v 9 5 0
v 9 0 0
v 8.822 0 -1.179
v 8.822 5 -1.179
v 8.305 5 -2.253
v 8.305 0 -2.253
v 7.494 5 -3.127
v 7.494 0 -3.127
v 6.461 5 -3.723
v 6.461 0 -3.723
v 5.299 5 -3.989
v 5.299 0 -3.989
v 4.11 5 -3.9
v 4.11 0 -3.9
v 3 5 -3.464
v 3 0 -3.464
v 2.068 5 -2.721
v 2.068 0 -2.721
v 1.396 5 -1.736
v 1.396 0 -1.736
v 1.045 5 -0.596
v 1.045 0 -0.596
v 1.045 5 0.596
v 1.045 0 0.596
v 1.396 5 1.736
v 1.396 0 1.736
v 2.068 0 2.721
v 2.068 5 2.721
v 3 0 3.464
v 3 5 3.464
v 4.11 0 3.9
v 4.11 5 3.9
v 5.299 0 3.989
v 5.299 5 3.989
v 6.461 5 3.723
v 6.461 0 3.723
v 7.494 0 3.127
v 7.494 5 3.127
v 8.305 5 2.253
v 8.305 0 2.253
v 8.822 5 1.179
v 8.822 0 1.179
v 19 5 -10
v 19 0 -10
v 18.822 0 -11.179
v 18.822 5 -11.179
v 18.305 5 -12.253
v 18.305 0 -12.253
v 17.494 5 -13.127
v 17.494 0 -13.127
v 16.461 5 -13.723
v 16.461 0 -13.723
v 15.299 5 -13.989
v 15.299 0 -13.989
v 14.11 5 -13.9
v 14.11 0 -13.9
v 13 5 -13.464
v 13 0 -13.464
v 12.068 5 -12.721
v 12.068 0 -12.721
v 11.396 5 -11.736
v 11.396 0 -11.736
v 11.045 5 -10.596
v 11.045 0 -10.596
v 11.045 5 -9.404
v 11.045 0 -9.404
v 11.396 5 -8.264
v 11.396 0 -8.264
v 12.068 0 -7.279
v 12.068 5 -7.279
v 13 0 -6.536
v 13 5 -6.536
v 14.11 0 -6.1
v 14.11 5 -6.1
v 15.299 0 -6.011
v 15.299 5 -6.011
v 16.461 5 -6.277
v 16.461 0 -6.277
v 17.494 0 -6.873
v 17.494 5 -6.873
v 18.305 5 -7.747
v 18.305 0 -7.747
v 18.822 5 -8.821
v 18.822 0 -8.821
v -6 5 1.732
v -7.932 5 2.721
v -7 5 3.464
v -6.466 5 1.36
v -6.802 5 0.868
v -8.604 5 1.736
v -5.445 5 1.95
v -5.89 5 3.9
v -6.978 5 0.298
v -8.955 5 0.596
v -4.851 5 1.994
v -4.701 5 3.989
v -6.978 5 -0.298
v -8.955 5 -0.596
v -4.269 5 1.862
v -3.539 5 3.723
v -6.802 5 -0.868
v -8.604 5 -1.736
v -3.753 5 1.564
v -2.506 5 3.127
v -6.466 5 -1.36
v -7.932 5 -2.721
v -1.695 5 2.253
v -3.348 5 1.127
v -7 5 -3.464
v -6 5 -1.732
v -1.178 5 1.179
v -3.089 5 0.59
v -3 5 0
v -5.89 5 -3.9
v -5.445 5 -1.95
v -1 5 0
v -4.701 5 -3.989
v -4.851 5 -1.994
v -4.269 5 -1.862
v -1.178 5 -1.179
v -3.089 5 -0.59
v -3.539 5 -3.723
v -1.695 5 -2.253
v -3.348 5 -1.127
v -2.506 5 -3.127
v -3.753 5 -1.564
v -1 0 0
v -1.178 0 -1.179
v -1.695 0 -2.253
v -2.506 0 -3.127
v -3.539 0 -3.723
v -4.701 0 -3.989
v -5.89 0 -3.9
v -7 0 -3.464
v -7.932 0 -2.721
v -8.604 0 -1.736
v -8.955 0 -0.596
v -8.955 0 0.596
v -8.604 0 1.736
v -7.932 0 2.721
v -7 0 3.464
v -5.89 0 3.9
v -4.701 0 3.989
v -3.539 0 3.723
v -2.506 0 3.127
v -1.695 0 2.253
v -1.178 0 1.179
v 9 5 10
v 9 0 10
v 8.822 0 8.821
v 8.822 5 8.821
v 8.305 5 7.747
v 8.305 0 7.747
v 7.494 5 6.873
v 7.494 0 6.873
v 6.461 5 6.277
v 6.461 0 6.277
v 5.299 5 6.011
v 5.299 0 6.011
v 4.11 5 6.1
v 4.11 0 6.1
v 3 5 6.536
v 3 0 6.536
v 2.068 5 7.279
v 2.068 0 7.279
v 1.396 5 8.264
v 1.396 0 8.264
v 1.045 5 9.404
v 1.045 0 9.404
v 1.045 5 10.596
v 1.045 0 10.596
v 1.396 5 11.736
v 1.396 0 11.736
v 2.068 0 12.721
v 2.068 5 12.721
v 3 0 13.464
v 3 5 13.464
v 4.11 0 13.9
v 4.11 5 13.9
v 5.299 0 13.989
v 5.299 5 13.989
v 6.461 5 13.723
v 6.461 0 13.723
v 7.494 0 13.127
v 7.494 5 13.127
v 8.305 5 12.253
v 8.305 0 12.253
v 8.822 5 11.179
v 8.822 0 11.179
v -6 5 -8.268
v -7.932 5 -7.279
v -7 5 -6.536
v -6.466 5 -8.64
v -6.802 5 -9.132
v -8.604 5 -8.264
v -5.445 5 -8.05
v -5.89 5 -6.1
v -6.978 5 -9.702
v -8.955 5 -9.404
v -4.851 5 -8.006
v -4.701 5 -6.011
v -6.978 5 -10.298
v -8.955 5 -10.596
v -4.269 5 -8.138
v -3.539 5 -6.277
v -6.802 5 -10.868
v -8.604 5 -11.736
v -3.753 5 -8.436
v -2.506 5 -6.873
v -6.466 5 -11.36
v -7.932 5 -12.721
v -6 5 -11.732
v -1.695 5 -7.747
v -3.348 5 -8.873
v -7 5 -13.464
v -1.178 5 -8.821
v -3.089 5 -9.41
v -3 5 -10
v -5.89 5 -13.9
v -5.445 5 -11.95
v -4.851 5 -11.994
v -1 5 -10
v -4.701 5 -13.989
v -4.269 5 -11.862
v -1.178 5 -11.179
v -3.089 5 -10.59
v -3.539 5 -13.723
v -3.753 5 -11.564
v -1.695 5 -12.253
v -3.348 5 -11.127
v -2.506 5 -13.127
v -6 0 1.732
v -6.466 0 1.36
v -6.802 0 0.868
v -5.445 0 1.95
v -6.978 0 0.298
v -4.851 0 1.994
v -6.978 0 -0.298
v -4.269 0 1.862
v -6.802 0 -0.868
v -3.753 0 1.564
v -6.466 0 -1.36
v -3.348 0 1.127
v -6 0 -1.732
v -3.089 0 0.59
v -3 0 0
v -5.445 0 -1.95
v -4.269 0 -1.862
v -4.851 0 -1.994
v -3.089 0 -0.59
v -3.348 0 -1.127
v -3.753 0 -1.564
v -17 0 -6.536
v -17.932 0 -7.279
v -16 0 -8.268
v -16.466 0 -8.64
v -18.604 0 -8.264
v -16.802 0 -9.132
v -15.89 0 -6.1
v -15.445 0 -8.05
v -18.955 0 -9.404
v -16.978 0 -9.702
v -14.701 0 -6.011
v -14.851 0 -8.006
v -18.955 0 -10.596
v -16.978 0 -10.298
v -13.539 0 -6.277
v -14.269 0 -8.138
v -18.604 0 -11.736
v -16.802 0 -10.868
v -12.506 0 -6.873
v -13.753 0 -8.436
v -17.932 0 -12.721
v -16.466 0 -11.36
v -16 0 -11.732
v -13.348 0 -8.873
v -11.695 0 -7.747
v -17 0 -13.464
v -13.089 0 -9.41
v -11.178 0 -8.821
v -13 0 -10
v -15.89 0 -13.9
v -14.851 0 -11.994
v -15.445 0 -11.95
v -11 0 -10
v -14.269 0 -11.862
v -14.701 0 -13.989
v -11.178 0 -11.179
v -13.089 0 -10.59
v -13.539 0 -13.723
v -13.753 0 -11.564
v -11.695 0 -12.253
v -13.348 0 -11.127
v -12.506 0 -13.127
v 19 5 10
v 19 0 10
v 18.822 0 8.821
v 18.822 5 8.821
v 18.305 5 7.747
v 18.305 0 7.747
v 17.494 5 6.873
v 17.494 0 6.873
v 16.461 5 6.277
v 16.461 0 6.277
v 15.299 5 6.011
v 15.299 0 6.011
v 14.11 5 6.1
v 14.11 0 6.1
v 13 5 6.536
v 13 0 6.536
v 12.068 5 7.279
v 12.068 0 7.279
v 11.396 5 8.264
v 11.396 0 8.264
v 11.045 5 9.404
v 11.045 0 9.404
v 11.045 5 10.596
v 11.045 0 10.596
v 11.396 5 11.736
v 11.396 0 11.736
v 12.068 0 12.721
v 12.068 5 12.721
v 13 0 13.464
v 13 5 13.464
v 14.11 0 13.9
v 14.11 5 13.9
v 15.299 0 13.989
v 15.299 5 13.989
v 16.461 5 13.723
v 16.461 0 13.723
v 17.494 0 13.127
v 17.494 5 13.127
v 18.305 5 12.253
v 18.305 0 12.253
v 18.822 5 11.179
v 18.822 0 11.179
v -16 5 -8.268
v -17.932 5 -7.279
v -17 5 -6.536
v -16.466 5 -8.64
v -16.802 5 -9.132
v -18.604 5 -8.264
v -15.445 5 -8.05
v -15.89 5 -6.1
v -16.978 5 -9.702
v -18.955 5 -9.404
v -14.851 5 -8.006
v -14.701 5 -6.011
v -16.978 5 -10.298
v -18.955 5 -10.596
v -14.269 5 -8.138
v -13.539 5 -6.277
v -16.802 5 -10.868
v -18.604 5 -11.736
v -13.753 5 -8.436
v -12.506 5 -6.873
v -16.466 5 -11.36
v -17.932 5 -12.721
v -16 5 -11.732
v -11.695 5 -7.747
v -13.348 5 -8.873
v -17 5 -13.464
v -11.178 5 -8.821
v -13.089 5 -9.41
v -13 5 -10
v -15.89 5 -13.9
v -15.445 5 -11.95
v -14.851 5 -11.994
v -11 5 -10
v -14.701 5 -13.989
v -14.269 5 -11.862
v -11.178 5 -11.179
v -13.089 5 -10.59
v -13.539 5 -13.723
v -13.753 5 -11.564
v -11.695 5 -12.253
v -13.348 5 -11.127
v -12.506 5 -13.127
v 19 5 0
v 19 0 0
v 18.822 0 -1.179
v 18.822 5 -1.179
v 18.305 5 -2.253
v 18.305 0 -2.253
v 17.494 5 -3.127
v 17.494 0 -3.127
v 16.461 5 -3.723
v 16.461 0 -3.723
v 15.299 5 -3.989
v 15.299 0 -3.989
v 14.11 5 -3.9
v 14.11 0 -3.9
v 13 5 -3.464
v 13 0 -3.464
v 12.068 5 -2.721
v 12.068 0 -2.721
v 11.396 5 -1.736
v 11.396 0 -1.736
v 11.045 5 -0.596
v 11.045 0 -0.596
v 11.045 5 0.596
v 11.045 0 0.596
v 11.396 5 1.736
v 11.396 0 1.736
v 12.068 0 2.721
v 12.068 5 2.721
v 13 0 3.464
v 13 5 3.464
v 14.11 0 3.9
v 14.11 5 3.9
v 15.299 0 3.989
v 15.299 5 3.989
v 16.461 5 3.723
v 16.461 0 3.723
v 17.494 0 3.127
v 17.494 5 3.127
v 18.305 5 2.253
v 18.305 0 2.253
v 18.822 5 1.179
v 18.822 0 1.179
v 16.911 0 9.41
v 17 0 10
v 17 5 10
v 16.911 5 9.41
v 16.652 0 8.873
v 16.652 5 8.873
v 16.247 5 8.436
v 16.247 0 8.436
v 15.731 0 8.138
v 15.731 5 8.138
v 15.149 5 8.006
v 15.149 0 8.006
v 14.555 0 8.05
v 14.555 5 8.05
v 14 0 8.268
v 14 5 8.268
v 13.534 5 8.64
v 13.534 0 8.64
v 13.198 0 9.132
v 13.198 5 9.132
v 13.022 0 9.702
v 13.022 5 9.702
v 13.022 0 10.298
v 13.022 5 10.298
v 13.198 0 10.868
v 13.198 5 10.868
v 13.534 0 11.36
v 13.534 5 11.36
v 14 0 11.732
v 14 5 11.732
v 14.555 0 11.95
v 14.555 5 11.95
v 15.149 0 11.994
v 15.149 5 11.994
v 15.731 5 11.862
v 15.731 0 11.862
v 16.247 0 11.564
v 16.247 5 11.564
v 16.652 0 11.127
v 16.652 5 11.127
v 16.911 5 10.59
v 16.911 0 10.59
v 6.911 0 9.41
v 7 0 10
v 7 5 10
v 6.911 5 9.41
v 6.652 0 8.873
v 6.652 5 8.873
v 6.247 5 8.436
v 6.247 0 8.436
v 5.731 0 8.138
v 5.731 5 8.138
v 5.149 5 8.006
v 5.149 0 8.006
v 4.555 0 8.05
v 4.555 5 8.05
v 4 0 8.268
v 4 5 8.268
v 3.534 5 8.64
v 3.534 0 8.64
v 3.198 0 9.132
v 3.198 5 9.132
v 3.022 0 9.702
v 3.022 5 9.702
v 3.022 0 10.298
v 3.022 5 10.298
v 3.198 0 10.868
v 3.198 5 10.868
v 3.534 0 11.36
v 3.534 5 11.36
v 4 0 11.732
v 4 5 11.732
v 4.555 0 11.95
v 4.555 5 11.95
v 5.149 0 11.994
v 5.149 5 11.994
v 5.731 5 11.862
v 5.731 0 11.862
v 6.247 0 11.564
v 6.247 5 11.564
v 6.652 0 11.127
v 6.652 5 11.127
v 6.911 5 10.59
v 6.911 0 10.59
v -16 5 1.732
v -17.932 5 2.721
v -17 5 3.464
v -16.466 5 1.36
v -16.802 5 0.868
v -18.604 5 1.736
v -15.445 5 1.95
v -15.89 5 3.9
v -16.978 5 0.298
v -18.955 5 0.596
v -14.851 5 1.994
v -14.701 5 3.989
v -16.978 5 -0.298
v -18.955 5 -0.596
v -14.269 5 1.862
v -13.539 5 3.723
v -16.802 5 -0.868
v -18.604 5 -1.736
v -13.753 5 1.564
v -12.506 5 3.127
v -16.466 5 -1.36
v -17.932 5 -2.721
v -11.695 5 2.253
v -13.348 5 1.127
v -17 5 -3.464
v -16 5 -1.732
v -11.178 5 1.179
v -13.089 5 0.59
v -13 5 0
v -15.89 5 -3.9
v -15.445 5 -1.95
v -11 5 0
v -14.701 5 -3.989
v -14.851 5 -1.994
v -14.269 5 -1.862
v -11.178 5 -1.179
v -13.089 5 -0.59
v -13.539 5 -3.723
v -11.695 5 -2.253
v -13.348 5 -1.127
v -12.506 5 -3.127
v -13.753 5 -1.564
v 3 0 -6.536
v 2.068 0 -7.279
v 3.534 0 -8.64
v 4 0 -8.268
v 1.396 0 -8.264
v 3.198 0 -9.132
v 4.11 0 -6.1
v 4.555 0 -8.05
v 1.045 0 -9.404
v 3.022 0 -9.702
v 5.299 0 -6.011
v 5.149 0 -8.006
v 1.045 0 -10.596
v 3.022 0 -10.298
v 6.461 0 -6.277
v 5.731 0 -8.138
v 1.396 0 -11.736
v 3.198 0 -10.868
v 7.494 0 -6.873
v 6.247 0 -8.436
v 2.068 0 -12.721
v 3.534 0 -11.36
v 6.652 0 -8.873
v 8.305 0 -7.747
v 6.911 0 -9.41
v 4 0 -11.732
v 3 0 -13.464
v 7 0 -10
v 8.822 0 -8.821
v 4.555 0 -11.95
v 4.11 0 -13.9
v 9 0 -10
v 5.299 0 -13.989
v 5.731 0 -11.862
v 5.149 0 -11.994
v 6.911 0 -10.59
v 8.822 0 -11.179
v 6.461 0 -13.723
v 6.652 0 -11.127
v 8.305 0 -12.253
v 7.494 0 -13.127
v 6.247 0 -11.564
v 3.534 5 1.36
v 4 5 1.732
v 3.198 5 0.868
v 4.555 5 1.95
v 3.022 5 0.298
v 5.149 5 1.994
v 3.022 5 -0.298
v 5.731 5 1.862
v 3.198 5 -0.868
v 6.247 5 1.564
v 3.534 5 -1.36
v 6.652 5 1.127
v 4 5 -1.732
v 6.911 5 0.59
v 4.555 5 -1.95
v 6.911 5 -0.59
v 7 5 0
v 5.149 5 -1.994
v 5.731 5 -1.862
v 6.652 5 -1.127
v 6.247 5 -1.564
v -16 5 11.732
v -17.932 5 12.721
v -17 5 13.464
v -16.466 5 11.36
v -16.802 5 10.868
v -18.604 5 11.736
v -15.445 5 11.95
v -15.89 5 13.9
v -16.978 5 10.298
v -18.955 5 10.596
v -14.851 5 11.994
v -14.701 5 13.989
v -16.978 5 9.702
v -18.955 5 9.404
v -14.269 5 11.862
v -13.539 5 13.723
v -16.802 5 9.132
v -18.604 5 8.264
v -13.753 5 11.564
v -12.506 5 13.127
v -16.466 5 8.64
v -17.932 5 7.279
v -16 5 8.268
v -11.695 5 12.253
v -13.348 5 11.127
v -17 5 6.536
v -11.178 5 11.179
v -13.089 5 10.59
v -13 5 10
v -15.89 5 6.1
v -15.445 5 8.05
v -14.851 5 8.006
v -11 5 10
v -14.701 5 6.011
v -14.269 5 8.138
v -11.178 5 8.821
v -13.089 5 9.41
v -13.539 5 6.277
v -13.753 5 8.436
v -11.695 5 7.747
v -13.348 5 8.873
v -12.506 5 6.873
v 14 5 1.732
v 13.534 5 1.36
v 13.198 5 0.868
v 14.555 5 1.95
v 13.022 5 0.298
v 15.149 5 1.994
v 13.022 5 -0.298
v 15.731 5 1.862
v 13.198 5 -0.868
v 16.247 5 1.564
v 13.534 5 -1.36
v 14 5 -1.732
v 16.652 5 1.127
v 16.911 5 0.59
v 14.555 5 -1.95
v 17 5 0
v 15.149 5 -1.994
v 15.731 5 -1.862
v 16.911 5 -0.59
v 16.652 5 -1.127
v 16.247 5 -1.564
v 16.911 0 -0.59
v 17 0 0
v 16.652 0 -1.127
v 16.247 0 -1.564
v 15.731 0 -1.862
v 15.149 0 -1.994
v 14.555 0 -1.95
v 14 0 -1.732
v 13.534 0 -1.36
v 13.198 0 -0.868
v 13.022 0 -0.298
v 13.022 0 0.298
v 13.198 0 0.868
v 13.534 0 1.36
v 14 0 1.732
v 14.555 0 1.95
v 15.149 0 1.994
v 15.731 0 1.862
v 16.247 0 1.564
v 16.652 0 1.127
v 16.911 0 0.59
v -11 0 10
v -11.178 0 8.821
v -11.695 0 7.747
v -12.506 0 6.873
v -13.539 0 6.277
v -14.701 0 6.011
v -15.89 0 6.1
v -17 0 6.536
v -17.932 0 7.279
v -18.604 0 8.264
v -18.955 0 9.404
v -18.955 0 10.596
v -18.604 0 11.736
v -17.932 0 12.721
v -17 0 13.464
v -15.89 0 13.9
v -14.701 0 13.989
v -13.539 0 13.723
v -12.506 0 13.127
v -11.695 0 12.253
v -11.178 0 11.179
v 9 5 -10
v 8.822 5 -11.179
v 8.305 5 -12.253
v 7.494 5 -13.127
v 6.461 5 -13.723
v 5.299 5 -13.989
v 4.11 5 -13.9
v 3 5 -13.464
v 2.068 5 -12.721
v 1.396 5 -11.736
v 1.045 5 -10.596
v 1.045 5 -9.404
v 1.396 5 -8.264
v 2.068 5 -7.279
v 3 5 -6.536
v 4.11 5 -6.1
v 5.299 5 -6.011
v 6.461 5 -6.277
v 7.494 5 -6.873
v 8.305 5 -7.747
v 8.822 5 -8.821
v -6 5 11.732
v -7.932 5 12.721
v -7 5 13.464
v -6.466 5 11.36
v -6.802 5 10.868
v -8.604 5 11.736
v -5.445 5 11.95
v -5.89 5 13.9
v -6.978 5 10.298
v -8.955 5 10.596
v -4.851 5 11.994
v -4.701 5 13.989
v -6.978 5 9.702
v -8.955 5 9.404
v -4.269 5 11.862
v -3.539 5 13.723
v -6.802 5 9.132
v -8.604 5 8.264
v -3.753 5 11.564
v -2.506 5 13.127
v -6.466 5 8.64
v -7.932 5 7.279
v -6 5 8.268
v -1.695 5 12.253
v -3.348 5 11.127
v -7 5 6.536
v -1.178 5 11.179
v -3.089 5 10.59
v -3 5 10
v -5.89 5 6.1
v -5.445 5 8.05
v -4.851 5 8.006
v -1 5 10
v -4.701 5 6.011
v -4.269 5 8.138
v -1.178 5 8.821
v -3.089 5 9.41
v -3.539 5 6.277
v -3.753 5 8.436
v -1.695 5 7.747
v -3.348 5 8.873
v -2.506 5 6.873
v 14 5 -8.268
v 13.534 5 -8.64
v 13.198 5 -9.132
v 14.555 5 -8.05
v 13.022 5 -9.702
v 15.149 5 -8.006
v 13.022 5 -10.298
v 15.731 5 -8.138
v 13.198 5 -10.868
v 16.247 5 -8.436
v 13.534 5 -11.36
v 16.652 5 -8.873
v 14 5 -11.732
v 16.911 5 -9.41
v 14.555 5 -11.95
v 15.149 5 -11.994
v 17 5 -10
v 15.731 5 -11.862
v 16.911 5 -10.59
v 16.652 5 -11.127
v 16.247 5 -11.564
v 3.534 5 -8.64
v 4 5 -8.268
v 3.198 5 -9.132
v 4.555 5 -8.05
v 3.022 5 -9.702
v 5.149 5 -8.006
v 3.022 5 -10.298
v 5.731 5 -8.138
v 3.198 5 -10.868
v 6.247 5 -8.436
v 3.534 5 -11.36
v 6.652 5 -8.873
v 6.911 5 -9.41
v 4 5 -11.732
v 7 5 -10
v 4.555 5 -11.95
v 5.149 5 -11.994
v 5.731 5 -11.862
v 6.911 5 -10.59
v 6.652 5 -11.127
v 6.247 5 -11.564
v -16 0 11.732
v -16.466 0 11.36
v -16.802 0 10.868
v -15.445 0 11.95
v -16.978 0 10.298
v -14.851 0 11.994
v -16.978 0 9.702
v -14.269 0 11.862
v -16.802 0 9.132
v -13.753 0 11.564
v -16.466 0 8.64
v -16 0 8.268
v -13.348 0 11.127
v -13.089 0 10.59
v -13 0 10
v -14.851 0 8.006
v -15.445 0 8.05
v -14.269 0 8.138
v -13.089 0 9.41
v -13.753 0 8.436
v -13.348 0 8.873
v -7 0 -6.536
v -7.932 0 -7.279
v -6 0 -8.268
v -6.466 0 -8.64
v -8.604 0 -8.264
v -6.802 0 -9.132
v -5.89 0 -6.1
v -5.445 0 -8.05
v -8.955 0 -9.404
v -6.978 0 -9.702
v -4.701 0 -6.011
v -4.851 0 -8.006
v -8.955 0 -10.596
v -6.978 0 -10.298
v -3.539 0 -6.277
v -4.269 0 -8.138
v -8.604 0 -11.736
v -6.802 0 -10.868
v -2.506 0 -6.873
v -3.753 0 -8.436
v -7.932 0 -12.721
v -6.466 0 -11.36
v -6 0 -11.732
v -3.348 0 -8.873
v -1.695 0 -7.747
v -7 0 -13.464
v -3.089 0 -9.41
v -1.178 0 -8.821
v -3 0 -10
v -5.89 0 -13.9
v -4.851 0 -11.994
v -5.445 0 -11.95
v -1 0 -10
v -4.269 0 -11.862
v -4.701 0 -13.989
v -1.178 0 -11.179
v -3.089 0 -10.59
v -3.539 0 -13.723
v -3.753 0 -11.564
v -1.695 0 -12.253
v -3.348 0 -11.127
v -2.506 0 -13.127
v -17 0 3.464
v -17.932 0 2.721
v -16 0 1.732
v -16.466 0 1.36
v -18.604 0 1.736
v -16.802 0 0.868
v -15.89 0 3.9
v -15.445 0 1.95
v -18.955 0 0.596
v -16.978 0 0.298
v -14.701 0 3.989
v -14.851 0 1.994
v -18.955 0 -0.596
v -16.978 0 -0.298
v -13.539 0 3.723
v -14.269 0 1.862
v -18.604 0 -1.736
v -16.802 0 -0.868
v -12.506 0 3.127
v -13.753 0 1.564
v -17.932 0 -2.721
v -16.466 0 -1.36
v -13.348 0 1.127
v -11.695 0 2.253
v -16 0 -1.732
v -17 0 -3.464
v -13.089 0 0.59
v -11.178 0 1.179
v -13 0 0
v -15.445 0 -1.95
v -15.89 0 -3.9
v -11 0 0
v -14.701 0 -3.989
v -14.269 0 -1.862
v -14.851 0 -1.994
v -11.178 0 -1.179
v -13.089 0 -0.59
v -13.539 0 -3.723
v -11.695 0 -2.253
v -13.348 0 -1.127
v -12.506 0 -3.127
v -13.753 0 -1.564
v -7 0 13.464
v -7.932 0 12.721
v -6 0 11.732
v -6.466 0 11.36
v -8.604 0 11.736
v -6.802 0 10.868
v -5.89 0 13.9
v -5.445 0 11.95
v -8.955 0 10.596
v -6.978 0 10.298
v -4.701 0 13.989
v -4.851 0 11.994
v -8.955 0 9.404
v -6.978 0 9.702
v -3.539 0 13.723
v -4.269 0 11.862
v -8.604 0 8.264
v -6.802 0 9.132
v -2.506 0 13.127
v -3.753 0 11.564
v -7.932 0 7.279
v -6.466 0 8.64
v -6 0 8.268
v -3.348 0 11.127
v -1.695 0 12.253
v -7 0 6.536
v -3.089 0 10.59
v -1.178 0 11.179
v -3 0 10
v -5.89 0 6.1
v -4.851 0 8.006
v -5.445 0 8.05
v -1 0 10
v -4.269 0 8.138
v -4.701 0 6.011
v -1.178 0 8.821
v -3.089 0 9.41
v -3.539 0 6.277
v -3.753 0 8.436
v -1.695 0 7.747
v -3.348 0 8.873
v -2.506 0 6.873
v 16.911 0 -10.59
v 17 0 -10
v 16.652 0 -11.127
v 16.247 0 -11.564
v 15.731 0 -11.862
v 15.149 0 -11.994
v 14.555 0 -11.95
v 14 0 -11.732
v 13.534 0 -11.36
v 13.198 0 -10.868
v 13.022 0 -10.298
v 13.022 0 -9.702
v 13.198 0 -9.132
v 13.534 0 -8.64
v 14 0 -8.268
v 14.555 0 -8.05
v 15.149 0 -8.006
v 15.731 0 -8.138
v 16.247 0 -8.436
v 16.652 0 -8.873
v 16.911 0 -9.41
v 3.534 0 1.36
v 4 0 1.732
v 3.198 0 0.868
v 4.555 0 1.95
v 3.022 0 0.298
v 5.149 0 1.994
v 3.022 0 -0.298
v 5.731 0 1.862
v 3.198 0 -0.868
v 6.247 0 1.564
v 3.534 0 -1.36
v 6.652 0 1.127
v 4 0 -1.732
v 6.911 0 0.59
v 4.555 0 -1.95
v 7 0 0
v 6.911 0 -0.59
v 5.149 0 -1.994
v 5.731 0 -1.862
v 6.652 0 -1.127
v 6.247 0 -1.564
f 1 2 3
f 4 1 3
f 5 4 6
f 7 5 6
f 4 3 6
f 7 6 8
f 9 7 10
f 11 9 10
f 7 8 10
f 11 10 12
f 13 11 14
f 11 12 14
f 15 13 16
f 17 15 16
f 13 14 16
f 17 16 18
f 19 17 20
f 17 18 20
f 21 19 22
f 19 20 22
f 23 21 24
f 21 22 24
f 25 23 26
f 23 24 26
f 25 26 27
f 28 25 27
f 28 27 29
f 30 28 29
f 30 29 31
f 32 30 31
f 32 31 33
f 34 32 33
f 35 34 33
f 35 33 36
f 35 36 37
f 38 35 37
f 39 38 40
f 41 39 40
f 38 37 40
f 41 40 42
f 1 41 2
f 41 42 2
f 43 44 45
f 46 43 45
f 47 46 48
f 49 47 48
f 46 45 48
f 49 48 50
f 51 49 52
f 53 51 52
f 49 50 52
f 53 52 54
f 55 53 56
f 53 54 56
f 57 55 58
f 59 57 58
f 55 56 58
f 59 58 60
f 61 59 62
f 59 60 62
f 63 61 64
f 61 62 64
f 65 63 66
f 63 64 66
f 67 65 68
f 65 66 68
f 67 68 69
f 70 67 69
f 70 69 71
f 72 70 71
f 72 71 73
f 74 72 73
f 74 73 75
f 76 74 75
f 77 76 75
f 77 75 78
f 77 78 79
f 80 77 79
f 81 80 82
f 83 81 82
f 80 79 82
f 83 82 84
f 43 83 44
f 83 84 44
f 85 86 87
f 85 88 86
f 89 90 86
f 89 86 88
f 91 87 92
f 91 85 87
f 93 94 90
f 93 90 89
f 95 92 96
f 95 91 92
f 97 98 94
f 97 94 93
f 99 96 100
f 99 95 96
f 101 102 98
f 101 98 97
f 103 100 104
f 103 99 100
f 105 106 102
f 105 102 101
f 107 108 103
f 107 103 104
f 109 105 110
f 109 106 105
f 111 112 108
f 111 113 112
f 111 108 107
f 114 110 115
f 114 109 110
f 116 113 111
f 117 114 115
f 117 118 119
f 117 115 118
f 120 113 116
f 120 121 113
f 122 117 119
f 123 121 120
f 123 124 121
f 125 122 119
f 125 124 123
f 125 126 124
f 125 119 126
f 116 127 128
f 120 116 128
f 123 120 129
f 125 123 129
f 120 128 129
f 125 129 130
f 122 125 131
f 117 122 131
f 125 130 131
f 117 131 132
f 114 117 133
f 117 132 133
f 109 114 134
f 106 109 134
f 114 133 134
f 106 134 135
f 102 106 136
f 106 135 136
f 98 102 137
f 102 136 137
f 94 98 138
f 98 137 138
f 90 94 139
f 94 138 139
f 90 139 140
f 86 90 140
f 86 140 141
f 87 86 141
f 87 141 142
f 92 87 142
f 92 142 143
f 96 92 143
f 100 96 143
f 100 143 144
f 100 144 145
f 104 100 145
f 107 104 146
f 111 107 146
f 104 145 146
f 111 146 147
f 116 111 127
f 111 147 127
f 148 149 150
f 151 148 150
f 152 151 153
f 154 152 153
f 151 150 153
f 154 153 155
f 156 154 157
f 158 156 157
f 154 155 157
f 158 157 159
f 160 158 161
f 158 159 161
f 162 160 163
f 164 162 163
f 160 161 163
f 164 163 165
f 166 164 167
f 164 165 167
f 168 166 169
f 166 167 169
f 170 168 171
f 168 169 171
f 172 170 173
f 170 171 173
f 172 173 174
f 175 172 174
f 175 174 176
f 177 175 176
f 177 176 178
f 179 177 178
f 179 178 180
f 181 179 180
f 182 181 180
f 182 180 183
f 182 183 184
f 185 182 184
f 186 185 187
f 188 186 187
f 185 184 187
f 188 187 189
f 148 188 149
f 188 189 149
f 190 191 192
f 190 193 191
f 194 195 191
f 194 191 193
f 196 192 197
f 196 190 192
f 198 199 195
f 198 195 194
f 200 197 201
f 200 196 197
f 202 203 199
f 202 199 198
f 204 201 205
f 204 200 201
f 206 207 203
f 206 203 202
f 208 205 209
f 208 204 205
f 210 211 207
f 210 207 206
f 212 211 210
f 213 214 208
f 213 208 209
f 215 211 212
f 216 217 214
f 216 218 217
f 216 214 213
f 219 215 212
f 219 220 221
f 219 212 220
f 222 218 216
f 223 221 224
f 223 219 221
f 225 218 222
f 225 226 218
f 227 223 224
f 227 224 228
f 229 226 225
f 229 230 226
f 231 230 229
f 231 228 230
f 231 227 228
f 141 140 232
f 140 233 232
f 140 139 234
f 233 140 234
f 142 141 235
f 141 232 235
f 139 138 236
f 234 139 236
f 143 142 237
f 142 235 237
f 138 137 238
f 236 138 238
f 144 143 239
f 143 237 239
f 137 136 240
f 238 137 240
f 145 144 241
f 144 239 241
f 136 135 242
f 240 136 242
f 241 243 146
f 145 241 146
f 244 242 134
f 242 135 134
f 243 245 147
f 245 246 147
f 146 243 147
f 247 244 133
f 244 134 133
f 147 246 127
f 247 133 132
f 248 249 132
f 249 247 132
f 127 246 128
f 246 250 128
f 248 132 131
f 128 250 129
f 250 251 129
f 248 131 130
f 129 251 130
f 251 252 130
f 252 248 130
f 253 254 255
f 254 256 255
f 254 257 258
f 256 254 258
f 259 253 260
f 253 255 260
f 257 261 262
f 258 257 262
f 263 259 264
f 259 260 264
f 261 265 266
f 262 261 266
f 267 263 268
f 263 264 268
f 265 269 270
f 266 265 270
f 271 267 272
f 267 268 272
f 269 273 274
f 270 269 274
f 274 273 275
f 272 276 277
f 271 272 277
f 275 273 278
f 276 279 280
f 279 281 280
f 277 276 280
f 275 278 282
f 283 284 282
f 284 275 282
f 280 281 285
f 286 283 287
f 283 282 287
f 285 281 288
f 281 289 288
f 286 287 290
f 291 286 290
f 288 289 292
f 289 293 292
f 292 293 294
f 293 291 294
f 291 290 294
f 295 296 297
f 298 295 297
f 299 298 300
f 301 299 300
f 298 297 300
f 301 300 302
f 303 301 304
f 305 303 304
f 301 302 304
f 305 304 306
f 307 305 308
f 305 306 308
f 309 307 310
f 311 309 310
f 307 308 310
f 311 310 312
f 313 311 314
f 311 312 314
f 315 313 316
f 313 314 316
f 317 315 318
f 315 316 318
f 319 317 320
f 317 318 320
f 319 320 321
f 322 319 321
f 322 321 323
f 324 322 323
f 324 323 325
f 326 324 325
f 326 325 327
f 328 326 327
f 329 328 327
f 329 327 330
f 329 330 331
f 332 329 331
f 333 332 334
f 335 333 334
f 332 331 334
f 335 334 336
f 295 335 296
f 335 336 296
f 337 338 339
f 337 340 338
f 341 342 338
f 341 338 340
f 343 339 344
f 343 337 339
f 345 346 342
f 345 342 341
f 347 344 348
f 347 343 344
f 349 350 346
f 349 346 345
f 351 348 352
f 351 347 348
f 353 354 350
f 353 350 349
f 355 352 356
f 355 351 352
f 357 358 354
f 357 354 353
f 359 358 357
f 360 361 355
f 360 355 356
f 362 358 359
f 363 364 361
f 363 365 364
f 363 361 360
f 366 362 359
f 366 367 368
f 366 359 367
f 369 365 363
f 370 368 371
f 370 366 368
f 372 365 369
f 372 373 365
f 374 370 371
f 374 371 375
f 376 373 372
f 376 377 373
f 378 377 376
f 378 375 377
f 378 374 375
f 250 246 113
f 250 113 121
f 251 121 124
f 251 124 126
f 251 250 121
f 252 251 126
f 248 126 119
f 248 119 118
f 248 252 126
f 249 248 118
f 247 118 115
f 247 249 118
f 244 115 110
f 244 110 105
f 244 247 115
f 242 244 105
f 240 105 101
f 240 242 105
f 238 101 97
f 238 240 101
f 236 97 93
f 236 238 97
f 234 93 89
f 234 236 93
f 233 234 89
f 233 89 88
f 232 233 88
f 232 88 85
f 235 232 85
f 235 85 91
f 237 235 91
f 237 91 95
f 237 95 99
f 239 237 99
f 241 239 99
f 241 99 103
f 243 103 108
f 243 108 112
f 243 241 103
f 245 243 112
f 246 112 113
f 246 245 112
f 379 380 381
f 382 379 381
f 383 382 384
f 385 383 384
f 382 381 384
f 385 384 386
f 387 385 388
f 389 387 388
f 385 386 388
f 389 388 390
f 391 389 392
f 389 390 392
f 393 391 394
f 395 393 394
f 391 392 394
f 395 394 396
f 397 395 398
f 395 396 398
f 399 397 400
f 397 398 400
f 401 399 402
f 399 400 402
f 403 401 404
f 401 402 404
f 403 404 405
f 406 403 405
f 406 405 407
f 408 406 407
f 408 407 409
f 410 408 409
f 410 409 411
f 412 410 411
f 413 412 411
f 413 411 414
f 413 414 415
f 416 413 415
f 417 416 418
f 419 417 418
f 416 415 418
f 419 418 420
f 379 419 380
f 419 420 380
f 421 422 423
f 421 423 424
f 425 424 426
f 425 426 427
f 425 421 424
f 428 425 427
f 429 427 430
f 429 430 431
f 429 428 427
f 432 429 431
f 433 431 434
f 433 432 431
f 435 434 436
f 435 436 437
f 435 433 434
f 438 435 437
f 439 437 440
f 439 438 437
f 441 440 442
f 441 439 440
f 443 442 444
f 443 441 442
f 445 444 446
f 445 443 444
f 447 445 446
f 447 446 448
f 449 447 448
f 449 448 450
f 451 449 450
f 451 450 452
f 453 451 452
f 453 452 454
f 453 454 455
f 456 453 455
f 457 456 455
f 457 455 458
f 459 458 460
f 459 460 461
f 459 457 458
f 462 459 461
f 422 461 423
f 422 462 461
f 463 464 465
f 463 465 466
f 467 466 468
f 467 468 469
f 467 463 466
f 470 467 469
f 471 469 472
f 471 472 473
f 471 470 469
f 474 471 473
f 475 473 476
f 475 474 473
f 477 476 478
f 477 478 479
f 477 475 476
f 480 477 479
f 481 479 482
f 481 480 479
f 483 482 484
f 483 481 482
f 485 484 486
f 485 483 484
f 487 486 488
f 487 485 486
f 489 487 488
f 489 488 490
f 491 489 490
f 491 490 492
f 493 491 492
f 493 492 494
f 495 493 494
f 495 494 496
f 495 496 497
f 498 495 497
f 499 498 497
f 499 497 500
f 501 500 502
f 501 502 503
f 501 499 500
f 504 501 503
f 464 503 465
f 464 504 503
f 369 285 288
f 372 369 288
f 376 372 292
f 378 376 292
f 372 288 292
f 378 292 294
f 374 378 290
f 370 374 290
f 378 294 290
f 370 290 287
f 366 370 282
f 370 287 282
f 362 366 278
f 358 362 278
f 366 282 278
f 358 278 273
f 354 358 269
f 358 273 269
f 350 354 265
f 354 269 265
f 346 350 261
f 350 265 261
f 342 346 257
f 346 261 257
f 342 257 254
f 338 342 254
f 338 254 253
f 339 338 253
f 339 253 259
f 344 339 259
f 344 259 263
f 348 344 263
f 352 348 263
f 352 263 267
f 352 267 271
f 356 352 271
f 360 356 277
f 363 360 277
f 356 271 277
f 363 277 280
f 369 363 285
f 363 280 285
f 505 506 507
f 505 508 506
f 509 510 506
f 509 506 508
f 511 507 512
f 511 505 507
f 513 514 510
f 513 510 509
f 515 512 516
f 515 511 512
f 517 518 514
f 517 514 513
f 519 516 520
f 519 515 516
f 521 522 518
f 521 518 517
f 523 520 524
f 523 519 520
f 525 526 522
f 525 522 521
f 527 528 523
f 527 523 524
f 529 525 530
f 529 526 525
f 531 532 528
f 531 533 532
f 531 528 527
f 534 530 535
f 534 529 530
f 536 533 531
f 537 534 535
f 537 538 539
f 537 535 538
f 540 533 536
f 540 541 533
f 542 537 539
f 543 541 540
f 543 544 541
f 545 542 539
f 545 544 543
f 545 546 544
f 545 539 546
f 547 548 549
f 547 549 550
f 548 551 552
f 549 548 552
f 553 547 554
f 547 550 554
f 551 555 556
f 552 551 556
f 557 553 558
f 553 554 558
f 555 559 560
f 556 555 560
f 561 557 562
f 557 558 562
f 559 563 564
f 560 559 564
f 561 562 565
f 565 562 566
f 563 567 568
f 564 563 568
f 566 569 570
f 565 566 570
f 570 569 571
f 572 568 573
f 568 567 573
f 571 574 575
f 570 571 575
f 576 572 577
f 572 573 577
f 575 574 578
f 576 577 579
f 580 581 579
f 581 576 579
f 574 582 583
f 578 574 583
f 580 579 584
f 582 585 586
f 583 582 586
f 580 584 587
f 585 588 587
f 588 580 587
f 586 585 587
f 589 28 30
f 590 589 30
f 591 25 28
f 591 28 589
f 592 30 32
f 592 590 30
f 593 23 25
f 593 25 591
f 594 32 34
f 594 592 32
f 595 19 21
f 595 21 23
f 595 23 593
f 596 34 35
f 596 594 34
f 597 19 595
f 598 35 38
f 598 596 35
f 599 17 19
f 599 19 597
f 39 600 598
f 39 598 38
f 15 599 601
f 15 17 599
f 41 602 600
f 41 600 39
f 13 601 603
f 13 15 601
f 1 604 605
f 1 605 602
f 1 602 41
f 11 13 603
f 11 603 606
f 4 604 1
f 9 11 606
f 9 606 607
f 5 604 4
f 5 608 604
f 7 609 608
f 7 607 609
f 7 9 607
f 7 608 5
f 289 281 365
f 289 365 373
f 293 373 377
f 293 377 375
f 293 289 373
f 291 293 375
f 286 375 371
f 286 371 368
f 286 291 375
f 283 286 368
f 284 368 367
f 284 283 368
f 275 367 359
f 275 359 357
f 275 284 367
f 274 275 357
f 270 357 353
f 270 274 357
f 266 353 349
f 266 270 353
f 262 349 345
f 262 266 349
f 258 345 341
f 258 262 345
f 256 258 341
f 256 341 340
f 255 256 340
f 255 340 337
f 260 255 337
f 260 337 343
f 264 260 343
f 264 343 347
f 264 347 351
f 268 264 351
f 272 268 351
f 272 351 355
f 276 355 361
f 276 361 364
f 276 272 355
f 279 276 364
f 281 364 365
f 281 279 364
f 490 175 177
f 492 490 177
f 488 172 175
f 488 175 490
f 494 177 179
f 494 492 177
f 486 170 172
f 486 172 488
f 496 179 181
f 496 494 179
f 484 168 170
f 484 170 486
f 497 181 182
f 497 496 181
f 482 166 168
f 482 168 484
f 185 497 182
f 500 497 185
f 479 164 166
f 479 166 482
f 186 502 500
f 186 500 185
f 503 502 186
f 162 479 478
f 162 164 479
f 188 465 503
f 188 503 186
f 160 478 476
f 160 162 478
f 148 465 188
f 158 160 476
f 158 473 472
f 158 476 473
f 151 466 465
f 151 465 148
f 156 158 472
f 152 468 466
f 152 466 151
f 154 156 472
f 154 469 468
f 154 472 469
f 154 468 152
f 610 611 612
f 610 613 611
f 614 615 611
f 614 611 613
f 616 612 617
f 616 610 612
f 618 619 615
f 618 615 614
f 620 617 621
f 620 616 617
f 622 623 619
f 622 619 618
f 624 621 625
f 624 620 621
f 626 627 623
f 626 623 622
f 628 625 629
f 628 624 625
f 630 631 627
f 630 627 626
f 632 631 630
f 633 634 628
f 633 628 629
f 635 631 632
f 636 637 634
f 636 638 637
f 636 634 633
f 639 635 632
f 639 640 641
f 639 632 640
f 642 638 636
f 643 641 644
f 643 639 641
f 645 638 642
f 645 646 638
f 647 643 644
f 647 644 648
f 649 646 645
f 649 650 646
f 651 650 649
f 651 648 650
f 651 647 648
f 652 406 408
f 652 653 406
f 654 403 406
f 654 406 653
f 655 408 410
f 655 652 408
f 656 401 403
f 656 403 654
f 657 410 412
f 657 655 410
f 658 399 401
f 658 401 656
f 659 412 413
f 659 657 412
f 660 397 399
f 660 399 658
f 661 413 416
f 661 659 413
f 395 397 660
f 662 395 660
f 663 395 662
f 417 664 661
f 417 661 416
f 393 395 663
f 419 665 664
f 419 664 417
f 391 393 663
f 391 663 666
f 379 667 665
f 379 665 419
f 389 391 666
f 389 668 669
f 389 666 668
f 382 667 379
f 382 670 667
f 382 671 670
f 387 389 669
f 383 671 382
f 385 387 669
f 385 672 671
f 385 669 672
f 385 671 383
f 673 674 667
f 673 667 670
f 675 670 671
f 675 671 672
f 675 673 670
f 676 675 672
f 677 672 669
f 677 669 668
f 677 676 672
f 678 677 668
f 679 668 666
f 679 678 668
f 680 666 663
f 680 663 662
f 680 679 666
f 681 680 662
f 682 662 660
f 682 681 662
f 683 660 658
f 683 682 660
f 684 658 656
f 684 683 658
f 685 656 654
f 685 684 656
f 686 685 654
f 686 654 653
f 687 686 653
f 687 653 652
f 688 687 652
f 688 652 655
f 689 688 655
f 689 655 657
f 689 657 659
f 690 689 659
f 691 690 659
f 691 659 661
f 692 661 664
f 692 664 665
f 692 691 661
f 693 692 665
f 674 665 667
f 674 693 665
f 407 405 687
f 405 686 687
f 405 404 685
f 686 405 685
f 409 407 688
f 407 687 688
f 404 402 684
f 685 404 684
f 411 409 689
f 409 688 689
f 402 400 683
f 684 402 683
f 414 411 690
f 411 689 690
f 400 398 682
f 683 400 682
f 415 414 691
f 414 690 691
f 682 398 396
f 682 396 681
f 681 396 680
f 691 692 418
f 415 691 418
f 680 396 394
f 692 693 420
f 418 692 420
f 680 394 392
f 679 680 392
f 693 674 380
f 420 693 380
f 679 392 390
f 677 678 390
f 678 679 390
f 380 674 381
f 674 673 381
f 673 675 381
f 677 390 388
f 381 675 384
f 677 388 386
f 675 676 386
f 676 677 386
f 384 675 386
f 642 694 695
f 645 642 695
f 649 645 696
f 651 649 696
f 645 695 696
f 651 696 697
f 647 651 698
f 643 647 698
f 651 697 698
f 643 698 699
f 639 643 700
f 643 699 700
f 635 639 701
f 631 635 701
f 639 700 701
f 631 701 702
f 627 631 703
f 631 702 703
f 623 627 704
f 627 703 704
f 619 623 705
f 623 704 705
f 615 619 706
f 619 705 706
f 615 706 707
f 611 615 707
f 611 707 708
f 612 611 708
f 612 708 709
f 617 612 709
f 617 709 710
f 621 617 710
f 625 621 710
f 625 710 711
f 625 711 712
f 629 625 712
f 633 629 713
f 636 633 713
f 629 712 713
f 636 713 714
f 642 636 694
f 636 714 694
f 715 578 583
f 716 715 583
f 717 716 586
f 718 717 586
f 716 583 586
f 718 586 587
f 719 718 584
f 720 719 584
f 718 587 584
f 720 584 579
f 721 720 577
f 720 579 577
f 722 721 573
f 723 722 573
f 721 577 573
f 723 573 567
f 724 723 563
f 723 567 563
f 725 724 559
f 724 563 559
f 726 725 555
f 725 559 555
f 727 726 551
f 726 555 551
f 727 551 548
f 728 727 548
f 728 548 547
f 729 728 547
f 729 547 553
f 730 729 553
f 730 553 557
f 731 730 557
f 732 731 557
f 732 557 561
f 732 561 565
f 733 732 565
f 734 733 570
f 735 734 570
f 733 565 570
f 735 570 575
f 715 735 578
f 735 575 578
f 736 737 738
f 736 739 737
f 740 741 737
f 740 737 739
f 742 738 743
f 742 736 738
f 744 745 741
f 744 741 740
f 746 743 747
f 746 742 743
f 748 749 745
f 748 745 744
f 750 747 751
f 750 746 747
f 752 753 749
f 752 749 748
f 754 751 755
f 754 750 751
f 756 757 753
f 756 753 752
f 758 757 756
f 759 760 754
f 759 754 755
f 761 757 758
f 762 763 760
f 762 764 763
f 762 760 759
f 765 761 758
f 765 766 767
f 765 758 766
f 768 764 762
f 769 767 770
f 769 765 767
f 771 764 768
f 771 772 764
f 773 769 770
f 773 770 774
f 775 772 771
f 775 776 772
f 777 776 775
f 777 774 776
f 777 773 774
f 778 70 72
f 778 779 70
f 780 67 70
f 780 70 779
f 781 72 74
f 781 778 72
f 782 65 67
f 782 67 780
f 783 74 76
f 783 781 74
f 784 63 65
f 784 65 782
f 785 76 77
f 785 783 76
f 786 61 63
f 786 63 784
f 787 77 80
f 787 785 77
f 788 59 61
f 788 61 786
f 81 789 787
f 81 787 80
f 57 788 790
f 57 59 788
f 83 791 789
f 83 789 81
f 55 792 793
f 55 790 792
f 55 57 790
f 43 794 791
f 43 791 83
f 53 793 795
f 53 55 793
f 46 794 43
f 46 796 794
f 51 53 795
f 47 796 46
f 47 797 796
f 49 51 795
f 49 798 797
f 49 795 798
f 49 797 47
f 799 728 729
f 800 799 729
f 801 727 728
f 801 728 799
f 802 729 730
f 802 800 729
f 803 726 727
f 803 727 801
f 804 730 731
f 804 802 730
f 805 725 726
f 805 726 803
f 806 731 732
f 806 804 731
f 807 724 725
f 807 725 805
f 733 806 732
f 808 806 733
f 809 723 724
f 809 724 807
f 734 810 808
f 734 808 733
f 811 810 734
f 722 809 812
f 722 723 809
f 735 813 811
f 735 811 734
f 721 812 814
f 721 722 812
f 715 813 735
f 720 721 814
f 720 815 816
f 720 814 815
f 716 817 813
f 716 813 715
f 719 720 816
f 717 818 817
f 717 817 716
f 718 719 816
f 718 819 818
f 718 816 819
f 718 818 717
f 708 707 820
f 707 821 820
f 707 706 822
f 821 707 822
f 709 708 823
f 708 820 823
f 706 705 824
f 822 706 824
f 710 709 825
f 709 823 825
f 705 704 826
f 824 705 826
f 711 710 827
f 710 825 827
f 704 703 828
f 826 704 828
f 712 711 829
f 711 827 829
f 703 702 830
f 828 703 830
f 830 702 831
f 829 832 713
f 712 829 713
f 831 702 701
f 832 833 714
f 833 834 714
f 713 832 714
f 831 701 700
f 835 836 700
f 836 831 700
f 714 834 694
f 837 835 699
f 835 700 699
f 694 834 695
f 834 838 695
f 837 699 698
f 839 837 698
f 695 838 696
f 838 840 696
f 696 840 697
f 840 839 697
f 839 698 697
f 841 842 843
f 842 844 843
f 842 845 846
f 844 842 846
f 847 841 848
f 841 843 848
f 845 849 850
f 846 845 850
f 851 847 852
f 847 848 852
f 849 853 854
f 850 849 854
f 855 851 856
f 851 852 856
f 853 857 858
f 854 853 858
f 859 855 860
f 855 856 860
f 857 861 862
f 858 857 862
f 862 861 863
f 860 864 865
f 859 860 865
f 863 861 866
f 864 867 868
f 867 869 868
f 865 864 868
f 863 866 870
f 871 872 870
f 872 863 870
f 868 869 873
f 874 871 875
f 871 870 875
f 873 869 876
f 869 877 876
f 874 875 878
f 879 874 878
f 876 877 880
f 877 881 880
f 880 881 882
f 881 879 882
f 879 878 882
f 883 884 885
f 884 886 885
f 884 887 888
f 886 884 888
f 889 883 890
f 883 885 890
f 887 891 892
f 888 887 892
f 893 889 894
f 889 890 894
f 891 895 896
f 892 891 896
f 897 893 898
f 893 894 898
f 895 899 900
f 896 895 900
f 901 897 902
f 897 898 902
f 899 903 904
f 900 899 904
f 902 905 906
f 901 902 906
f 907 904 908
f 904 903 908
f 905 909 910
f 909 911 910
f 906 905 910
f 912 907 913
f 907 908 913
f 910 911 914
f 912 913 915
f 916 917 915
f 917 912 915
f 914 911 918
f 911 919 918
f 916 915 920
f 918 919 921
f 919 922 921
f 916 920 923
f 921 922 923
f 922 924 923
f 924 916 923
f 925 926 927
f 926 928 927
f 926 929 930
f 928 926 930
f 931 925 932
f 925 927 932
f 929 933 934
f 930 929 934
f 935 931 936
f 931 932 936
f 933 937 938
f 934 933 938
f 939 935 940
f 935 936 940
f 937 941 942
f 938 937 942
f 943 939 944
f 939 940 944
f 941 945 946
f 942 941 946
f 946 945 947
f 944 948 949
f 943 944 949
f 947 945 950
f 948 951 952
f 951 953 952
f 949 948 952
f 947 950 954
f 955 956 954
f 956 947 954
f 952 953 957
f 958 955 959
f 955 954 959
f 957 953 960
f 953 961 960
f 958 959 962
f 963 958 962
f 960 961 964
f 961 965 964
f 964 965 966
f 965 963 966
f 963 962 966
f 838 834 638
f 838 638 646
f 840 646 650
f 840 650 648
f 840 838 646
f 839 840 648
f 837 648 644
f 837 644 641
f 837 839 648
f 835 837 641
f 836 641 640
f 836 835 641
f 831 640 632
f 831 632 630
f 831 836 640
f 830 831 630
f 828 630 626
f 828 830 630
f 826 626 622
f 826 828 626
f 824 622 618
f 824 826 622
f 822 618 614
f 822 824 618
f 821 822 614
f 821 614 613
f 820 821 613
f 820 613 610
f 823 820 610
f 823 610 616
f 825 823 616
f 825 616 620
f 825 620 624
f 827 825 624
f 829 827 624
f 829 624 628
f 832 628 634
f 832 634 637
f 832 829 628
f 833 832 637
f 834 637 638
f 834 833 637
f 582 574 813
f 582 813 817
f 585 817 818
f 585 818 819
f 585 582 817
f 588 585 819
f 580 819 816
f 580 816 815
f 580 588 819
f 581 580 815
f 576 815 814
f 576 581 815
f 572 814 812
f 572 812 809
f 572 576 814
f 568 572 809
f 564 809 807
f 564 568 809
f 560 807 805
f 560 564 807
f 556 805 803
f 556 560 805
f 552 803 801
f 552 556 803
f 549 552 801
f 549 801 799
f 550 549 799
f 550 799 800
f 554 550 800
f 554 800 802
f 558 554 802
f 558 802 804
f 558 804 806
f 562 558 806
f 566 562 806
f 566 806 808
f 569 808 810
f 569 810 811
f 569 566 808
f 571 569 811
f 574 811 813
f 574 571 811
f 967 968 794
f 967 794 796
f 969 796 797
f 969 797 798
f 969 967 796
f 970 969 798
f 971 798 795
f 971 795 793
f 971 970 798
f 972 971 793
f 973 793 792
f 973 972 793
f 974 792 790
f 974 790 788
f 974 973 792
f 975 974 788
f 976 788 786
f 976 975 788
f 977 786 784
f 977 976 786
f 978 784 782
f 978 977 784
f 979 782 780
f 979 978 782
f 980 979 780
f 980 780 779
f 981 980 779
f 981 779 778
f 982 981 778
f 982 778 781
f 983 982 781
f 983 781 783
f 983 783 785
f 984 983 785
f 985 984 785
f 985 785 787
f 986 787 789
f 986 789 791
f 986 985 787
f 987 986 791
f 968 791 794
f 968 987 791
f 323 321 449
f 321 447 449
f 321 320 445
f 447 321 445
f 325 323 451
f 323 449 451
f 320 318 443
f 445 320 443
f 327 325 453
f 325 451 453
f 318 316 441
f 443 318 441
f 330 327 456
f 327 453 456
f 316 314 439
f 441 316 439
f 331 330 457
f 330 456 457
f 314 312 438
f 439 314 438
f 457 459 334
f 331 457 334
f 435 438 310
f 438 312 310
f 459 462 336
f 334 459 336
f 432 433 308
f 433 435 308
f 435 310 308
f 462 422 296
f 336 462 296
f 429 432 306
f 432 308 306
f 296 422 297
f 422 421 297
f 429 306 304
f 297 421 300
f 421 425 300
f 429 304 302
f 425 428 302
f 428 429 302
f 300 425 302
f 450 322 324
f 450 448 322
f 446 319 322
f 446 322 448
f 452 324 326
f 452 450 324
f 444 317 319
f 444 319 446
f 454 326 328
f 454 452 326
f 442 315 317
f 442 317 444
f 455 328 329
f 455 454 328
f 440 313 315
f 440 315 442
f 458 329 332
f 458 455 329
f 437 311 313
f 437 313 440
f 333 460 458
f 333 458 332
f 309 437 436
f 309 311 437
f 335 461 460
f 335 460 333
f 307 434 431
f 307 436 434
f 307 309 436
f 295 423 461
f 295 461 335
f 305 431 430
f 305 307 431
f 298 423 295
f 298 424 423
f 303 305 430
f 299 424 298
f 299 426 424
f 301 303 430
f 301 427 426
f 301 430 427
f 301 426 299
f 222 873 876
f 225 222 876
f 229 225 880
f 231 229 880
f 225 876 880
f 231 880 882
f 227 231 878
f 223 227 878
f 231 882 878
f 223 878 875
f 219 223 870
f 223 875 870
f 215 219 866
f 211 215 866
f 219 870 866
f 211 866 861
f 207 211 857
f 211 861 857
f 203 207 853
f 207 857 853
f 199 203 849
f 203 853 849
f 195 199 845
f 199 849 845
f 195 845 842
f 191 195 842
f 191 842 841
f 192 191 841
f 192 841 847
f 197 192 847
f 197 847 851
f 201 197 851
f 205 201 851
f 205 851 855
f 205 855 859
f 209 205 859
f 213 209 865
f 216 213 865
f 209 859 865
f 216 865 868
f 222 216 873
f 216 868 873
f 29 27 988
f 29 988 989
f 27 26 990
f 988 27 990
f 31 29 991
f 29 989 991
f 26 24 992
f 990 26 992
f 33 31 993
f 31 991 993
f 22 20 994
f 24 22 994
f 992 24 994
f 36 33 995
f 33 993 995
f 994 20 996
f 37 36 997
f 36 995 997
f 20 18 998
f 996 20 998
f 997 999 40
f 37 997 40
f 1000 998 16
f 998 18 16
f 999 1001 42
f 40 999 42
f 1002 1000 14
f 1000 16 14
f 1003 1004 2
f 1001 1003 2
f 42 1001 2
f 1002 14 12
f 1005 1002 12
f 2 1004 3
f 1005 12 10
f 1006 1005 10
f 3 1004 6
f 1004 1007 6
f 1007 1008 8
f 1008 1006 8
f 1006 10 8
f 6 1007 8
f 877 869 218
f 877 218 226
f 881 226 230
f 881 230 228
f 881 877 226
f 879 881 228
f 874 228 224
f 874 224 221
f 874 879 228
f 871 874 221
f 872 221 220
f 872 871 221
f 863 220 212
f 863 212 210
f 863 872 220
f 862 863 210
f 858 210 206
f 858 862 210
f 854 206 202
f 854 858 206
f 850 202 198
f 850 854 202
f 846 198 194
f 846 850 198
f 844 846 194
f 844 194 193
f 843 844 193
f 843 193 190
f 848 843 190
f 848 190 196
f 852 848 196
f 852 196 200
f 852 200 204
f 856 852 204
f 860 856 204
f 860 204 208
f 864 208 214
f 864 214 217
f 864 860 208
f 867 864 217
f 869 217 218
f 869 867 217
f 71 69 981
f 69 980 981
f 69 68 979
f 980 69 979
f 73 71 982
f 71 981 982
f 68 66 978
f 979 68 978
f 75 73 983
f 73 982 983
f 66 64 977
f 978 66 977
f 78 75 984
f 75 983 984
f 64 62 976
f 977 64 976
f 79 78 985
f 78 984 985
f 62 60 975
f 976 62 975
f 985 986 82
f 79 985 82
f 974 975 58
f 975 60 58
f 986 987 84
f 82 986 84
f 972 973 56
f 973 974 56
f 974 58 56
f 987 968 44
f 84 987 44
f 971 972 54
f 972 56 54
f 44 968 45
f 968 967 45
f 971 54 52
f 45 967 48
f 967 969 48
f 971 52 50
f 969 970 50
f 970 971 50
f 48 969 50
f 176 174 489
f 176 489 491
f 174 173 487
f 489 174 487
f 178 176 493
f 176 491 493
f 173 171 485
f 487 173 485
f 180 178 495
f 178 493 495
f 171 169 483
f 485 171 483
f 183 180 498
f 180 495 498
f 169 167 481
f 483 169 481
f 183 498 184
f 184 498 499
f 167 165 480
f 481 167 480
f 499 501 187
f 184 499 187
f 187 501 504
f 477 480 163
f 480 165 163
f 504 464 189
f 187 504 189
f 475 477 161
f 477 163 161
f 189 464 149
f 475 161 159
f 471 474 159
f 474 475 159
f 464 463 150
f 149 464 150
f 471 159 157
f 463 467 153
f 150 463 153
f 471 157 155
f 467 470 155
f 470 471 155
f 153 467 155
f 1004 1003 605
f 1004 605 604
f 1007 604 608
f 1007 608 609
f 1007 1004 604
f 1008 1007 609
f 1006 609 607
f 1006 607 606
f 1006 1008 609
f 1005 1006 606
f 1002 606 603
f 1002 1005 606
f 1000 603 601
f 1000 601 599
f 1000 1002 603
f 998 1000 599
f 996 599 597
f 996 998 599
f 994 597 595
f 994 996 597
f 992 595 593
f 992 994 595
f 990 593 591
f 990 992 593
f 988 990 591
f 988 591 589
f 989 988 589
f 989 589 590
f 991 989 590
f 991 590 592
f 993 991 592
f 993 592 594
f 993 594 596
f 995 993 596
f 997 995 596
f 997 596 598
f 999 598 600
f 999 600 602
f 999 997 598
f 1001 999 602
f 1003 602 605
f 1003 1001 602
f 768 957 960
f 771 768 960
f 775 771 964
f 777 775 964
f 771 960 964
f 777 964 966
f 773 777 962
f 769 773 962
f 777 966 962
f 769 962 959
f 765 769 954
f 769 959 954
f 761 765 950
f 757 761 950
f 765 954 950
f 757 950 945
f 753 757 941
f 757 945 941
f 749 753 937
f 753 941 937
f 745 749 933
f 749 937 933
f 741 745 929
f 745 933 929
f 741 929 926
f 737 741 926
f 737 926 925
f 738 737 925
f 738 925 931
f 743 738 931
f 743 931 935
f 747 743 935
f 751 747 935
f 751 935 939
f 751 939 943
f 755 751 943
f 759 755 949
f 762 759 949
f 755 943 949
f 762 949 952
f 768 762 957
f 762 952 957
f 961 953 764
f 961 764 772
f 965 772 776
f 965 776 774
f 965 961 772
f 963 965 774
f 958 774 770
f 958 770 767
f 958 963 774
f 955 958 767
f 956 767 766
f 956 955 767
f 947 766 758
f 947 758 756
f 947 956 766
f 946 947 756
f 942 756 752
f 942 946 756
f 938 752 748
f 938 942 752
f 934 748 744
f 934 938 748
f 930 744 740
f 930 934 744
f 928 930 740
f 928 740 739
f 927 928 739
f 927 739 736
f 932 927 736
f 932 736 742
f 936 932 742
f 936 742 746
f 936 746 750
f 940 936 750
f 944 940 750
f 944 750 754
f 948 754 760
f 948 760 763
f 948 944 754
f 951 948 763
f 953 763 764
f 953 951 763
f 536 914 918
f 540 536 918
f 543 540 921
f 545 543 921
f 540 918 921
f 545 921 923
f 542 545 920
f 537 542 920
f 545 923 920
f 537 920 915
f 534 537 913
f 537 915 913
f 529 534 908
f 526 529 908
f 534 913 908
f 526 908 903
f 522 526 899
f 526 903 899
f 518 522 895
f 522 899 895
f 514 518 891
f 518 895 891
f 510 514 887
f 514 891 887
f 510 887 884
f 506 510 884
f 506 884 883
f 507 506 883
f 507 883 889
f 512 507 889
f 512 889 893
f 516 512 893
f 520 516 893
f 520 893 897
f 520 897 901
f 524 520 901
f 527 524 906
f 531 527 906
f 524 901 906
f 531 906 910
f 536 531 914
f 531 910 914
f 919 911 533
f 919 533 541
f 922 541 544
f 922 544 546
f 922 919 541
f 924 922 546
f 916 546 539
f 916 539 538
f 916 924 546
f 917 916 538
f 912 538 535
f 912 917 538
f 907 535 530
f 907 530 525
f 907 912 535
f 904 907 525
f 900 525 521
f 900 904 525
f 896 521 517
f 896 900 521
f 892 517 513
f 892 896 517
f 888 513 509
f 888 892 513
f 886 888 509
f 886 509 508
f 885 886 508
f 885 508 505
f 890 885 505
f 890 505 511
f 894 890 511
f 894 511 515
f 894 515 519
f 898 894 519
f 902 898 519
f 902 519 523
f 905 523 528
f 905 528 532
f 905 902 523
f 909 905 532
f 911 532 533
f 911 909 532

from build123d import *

# Parameters (mm, degrees)
SKETCH1_R              = 4
SKETCH1_R_2            = 2
BOSS_EXTRUDE1_DEPTH    = 5
BOSS_EXTRUDE1_2_DEPTH  = 5
BOSS_EXTRUDE1_3_DEPTH  = 5
BOSS_EXTRUDE1_4_DEPTH  = 5
BOSS_EXTRUDE1_5_DEPTH  = 5
BOSS_EXTRUDE1_6_DEPTH  = 5
BOSS_EXTRUDE1_7_DEPTH  = 5
BOSS_EXTRUDE1_8_DEPTH  = 5
BOSS_EXTRUDE1_9_DEPTH  = 5
BOSS_EXTRUDE1_10_DEPTH = 5
BOSS_EXTRUDE1_11_DEPTH = 5
BOSS_EXTRUDE1_12_DEPTH = 5


with BuildPart() as part:
    # Sketch1 → Boss-Extrude1 (new body)
    with BuildSketch(Plane(origin=(0, 0, 0), x_dir=(1, 0, 0), z_dir=(0, 1, 0))):
        with Locations((-15, -10)):
            Circle(SKETCH1_R)
        with Locations((-15, -10)):
            Circle(SKETCH1_R_2, mode=Mode.SUBTRACT)
    extrude(amount=BOSS_EXTRUDE1_DEPTH)


with BuildPart() as body_2:
    # Sketch1 → Boss-Extrude1 2 (new body)
    with BuildSketch(Plane(origin=(0, 0, 0), x_dir=(1, 0, 0), z_dir=(0, 1, 0))):
        with Locations((-5, -10)):
            Circle(SKETCH1_R)
        with Locations((-5, -10)):
            Circle(SKETCH1_R_2, mode=Mode.SUBTRACT)
    extrude(amount=BOSS_EXTRUDE1_2_DEPTH)


with BuildPart() as body_3:
    # Sketch1 → Boss-Extrude1 3 (new body)
    with BuildSketch(Plane(origin=(0, 0, 0), x_dir=(1, 0, 0), z_dir=(0, 1, 0))):
        with Locations((5, -10)):
            Circle(SKETCH1_R)
        with Locations((5, -10)):
            Circle(SKETCH1_R_2, mode=Mode.SUBTRACT)
    extrude(amount=BOSS_EXTRUDE1_3_DEPTH)


with BuildPart() as body_4:
    # Sketch1 → Boss-Extrude1 4 (new body)
    with BuildSketch(Plane(origin=(0, 0, 0), x_dir=(1, 0, 0), z_dir=(0, 1, 0))):
        with Locations((15, -10)):
            Circle(SKETCH1_R)
        with Locations((15, -10)):
            Circle(SKETCH1_R_2, mode=Mode.SUBTRACT)
    extrude(amount=BOSS_EXTRUDE1_4_DEPTH)


with BuildPart() as body_5:
    # Sketch1 → Boss-Extrude1 5 (new body)
    with BuildSketch(Plane(origin=(0, 0, 0), x_dir=(1, 0, 0), z_dir=(0, 1, 0))):
        with Locations((-5, 0)):
            Circle(SKETCH1_R)
        with Locations((-5, 0)):
            Circle(SKETCH1_R_2, mode=Mode.SUBTRACT)
    extrude(amount=BOSS_EXTRUDE1_5_DEPTH)


with BuildPart() as body_6:
    # Sketch1 → Boss-Extrude1 6 (new body)
    with BuildSketch(Plane(origin=(0, 0, 0), x_dir=(1, 0, 0), z_dir=(0, 1, 0))):
        with Locations((5, 0)):
            Circle(SKETCH1_R)
        with Locations((5, 0)):
            Circle(SKETCH1_R_2, mode=Mode.SUBTRACT)
    extrude(amount=BOSS_EXTRUDE1_6_DEPTH)


with BuildPart() as body_7:
    # Sketch1 → Boss-Extrude1 7 (new body)
    with BuildSketch(Plane(origin=(0, 0, 0), x_dir=(1, 0, 0), z_dir=(0, 1, 0))):
        with Locations((15, 0)):
            Circle(SKETCH1_R)
        with Locations((15, 0)):
            Circle(SKETCH1_R_2, mode=Mode.SUBTRACT)
    extrude(amount=BOSS_EXTRUDE1_7_DEPTH)


with BuildPart() as body_8:
    # Sketch1 → Boss-Extrude1 8 (new body)
    with BuildSketch(Plane(origin=(0, 0, 0), x_dir=(1, 0, 0), z_dir=(0, 1, 0))):
        with Locations((-5, 10)):
            Circle(SKETCH1_R)
        with Locations((-5, 10)):
            Circle(SKETCH1_R_2, mode=Mode.SUBTRACT)
    extrude(amount=BOSS_EXTRUDE1_8_DEPTH)


with BuildPart() as body_9:
    # Sketch1 → Boss-Extrude1 9 (new body)
    with BuildSketch(Plane(origin=(0, 0, 0), x_dir=(1, 0, 0), z_dir=(0, 1, 0))):
        with Locations((5, 10)):
            Circle(SKETCH1_R)
        with Locations((5, 10)):
            Circle(SKETCH1_R_2, mode=Mode.SUBTRACT)
    extrude(amount=BOSS_EXTRUDE1_9_DEPTH)


with BuildPart() as body_10:
    # Sketch1 → Boss-Extrude1 10 (new body)
    with BuildSketch(Plane(origin=(0, 0, 0), x_dir=(1, 0, 0), z_dir=(0, 1, 0))):
        with Locations((15, 10)):
            Circle(SKETCH1_R)
        with Locations((15, 10)):
            Circle(SKETCH1_R_2, mode=Mode.SUBTRACT)
    extrude(amount=BOSS_EXTRUDE1_10_DEPTH)


with BuildPart() as body_11:
    # Sketch1 → Boss-Extrude1 11 (new body)
    with BuildSketch(Plane(origin=(0, 0, 0), x_dir=(1, 0, 0), z_dir=(0, 1, 0))):
        with Locations((-15, 0)):
            Circle(SKETCH1_R)
        with Locations((-15, 0)):
            Circle(SKETCH1_R_2, mode=Mode.SUBTRACT)
    extrude(amount=BOSS_EXTRUDE1_11_DEPTH)


with BuildPart() as body_12:
    # Sketch1 → Boss-Extrude1 12 (new body)
    with BuildSketch(Plane(origin=(0, 0, 0), x_dir=(1, 0, 0), z_dir=(0, 1, 0))):
        with Locations((-15, 10)):
            Circle(SKETCH1_R)
        with Locations((-15, 10)):
            Circle(SKETCH1_R_2, mode=Mode.SUBTRACT)
    extrude(amount=BOSS_EXTRUDE1_12_DEPTH)


solid = Compound([part.part, body_2.part, body_3.part, body_4.part, body_5.part, body_6.part, body_7.part, body_8.part, body_9.part, body_10.part, body_11.part, body_12.part])
